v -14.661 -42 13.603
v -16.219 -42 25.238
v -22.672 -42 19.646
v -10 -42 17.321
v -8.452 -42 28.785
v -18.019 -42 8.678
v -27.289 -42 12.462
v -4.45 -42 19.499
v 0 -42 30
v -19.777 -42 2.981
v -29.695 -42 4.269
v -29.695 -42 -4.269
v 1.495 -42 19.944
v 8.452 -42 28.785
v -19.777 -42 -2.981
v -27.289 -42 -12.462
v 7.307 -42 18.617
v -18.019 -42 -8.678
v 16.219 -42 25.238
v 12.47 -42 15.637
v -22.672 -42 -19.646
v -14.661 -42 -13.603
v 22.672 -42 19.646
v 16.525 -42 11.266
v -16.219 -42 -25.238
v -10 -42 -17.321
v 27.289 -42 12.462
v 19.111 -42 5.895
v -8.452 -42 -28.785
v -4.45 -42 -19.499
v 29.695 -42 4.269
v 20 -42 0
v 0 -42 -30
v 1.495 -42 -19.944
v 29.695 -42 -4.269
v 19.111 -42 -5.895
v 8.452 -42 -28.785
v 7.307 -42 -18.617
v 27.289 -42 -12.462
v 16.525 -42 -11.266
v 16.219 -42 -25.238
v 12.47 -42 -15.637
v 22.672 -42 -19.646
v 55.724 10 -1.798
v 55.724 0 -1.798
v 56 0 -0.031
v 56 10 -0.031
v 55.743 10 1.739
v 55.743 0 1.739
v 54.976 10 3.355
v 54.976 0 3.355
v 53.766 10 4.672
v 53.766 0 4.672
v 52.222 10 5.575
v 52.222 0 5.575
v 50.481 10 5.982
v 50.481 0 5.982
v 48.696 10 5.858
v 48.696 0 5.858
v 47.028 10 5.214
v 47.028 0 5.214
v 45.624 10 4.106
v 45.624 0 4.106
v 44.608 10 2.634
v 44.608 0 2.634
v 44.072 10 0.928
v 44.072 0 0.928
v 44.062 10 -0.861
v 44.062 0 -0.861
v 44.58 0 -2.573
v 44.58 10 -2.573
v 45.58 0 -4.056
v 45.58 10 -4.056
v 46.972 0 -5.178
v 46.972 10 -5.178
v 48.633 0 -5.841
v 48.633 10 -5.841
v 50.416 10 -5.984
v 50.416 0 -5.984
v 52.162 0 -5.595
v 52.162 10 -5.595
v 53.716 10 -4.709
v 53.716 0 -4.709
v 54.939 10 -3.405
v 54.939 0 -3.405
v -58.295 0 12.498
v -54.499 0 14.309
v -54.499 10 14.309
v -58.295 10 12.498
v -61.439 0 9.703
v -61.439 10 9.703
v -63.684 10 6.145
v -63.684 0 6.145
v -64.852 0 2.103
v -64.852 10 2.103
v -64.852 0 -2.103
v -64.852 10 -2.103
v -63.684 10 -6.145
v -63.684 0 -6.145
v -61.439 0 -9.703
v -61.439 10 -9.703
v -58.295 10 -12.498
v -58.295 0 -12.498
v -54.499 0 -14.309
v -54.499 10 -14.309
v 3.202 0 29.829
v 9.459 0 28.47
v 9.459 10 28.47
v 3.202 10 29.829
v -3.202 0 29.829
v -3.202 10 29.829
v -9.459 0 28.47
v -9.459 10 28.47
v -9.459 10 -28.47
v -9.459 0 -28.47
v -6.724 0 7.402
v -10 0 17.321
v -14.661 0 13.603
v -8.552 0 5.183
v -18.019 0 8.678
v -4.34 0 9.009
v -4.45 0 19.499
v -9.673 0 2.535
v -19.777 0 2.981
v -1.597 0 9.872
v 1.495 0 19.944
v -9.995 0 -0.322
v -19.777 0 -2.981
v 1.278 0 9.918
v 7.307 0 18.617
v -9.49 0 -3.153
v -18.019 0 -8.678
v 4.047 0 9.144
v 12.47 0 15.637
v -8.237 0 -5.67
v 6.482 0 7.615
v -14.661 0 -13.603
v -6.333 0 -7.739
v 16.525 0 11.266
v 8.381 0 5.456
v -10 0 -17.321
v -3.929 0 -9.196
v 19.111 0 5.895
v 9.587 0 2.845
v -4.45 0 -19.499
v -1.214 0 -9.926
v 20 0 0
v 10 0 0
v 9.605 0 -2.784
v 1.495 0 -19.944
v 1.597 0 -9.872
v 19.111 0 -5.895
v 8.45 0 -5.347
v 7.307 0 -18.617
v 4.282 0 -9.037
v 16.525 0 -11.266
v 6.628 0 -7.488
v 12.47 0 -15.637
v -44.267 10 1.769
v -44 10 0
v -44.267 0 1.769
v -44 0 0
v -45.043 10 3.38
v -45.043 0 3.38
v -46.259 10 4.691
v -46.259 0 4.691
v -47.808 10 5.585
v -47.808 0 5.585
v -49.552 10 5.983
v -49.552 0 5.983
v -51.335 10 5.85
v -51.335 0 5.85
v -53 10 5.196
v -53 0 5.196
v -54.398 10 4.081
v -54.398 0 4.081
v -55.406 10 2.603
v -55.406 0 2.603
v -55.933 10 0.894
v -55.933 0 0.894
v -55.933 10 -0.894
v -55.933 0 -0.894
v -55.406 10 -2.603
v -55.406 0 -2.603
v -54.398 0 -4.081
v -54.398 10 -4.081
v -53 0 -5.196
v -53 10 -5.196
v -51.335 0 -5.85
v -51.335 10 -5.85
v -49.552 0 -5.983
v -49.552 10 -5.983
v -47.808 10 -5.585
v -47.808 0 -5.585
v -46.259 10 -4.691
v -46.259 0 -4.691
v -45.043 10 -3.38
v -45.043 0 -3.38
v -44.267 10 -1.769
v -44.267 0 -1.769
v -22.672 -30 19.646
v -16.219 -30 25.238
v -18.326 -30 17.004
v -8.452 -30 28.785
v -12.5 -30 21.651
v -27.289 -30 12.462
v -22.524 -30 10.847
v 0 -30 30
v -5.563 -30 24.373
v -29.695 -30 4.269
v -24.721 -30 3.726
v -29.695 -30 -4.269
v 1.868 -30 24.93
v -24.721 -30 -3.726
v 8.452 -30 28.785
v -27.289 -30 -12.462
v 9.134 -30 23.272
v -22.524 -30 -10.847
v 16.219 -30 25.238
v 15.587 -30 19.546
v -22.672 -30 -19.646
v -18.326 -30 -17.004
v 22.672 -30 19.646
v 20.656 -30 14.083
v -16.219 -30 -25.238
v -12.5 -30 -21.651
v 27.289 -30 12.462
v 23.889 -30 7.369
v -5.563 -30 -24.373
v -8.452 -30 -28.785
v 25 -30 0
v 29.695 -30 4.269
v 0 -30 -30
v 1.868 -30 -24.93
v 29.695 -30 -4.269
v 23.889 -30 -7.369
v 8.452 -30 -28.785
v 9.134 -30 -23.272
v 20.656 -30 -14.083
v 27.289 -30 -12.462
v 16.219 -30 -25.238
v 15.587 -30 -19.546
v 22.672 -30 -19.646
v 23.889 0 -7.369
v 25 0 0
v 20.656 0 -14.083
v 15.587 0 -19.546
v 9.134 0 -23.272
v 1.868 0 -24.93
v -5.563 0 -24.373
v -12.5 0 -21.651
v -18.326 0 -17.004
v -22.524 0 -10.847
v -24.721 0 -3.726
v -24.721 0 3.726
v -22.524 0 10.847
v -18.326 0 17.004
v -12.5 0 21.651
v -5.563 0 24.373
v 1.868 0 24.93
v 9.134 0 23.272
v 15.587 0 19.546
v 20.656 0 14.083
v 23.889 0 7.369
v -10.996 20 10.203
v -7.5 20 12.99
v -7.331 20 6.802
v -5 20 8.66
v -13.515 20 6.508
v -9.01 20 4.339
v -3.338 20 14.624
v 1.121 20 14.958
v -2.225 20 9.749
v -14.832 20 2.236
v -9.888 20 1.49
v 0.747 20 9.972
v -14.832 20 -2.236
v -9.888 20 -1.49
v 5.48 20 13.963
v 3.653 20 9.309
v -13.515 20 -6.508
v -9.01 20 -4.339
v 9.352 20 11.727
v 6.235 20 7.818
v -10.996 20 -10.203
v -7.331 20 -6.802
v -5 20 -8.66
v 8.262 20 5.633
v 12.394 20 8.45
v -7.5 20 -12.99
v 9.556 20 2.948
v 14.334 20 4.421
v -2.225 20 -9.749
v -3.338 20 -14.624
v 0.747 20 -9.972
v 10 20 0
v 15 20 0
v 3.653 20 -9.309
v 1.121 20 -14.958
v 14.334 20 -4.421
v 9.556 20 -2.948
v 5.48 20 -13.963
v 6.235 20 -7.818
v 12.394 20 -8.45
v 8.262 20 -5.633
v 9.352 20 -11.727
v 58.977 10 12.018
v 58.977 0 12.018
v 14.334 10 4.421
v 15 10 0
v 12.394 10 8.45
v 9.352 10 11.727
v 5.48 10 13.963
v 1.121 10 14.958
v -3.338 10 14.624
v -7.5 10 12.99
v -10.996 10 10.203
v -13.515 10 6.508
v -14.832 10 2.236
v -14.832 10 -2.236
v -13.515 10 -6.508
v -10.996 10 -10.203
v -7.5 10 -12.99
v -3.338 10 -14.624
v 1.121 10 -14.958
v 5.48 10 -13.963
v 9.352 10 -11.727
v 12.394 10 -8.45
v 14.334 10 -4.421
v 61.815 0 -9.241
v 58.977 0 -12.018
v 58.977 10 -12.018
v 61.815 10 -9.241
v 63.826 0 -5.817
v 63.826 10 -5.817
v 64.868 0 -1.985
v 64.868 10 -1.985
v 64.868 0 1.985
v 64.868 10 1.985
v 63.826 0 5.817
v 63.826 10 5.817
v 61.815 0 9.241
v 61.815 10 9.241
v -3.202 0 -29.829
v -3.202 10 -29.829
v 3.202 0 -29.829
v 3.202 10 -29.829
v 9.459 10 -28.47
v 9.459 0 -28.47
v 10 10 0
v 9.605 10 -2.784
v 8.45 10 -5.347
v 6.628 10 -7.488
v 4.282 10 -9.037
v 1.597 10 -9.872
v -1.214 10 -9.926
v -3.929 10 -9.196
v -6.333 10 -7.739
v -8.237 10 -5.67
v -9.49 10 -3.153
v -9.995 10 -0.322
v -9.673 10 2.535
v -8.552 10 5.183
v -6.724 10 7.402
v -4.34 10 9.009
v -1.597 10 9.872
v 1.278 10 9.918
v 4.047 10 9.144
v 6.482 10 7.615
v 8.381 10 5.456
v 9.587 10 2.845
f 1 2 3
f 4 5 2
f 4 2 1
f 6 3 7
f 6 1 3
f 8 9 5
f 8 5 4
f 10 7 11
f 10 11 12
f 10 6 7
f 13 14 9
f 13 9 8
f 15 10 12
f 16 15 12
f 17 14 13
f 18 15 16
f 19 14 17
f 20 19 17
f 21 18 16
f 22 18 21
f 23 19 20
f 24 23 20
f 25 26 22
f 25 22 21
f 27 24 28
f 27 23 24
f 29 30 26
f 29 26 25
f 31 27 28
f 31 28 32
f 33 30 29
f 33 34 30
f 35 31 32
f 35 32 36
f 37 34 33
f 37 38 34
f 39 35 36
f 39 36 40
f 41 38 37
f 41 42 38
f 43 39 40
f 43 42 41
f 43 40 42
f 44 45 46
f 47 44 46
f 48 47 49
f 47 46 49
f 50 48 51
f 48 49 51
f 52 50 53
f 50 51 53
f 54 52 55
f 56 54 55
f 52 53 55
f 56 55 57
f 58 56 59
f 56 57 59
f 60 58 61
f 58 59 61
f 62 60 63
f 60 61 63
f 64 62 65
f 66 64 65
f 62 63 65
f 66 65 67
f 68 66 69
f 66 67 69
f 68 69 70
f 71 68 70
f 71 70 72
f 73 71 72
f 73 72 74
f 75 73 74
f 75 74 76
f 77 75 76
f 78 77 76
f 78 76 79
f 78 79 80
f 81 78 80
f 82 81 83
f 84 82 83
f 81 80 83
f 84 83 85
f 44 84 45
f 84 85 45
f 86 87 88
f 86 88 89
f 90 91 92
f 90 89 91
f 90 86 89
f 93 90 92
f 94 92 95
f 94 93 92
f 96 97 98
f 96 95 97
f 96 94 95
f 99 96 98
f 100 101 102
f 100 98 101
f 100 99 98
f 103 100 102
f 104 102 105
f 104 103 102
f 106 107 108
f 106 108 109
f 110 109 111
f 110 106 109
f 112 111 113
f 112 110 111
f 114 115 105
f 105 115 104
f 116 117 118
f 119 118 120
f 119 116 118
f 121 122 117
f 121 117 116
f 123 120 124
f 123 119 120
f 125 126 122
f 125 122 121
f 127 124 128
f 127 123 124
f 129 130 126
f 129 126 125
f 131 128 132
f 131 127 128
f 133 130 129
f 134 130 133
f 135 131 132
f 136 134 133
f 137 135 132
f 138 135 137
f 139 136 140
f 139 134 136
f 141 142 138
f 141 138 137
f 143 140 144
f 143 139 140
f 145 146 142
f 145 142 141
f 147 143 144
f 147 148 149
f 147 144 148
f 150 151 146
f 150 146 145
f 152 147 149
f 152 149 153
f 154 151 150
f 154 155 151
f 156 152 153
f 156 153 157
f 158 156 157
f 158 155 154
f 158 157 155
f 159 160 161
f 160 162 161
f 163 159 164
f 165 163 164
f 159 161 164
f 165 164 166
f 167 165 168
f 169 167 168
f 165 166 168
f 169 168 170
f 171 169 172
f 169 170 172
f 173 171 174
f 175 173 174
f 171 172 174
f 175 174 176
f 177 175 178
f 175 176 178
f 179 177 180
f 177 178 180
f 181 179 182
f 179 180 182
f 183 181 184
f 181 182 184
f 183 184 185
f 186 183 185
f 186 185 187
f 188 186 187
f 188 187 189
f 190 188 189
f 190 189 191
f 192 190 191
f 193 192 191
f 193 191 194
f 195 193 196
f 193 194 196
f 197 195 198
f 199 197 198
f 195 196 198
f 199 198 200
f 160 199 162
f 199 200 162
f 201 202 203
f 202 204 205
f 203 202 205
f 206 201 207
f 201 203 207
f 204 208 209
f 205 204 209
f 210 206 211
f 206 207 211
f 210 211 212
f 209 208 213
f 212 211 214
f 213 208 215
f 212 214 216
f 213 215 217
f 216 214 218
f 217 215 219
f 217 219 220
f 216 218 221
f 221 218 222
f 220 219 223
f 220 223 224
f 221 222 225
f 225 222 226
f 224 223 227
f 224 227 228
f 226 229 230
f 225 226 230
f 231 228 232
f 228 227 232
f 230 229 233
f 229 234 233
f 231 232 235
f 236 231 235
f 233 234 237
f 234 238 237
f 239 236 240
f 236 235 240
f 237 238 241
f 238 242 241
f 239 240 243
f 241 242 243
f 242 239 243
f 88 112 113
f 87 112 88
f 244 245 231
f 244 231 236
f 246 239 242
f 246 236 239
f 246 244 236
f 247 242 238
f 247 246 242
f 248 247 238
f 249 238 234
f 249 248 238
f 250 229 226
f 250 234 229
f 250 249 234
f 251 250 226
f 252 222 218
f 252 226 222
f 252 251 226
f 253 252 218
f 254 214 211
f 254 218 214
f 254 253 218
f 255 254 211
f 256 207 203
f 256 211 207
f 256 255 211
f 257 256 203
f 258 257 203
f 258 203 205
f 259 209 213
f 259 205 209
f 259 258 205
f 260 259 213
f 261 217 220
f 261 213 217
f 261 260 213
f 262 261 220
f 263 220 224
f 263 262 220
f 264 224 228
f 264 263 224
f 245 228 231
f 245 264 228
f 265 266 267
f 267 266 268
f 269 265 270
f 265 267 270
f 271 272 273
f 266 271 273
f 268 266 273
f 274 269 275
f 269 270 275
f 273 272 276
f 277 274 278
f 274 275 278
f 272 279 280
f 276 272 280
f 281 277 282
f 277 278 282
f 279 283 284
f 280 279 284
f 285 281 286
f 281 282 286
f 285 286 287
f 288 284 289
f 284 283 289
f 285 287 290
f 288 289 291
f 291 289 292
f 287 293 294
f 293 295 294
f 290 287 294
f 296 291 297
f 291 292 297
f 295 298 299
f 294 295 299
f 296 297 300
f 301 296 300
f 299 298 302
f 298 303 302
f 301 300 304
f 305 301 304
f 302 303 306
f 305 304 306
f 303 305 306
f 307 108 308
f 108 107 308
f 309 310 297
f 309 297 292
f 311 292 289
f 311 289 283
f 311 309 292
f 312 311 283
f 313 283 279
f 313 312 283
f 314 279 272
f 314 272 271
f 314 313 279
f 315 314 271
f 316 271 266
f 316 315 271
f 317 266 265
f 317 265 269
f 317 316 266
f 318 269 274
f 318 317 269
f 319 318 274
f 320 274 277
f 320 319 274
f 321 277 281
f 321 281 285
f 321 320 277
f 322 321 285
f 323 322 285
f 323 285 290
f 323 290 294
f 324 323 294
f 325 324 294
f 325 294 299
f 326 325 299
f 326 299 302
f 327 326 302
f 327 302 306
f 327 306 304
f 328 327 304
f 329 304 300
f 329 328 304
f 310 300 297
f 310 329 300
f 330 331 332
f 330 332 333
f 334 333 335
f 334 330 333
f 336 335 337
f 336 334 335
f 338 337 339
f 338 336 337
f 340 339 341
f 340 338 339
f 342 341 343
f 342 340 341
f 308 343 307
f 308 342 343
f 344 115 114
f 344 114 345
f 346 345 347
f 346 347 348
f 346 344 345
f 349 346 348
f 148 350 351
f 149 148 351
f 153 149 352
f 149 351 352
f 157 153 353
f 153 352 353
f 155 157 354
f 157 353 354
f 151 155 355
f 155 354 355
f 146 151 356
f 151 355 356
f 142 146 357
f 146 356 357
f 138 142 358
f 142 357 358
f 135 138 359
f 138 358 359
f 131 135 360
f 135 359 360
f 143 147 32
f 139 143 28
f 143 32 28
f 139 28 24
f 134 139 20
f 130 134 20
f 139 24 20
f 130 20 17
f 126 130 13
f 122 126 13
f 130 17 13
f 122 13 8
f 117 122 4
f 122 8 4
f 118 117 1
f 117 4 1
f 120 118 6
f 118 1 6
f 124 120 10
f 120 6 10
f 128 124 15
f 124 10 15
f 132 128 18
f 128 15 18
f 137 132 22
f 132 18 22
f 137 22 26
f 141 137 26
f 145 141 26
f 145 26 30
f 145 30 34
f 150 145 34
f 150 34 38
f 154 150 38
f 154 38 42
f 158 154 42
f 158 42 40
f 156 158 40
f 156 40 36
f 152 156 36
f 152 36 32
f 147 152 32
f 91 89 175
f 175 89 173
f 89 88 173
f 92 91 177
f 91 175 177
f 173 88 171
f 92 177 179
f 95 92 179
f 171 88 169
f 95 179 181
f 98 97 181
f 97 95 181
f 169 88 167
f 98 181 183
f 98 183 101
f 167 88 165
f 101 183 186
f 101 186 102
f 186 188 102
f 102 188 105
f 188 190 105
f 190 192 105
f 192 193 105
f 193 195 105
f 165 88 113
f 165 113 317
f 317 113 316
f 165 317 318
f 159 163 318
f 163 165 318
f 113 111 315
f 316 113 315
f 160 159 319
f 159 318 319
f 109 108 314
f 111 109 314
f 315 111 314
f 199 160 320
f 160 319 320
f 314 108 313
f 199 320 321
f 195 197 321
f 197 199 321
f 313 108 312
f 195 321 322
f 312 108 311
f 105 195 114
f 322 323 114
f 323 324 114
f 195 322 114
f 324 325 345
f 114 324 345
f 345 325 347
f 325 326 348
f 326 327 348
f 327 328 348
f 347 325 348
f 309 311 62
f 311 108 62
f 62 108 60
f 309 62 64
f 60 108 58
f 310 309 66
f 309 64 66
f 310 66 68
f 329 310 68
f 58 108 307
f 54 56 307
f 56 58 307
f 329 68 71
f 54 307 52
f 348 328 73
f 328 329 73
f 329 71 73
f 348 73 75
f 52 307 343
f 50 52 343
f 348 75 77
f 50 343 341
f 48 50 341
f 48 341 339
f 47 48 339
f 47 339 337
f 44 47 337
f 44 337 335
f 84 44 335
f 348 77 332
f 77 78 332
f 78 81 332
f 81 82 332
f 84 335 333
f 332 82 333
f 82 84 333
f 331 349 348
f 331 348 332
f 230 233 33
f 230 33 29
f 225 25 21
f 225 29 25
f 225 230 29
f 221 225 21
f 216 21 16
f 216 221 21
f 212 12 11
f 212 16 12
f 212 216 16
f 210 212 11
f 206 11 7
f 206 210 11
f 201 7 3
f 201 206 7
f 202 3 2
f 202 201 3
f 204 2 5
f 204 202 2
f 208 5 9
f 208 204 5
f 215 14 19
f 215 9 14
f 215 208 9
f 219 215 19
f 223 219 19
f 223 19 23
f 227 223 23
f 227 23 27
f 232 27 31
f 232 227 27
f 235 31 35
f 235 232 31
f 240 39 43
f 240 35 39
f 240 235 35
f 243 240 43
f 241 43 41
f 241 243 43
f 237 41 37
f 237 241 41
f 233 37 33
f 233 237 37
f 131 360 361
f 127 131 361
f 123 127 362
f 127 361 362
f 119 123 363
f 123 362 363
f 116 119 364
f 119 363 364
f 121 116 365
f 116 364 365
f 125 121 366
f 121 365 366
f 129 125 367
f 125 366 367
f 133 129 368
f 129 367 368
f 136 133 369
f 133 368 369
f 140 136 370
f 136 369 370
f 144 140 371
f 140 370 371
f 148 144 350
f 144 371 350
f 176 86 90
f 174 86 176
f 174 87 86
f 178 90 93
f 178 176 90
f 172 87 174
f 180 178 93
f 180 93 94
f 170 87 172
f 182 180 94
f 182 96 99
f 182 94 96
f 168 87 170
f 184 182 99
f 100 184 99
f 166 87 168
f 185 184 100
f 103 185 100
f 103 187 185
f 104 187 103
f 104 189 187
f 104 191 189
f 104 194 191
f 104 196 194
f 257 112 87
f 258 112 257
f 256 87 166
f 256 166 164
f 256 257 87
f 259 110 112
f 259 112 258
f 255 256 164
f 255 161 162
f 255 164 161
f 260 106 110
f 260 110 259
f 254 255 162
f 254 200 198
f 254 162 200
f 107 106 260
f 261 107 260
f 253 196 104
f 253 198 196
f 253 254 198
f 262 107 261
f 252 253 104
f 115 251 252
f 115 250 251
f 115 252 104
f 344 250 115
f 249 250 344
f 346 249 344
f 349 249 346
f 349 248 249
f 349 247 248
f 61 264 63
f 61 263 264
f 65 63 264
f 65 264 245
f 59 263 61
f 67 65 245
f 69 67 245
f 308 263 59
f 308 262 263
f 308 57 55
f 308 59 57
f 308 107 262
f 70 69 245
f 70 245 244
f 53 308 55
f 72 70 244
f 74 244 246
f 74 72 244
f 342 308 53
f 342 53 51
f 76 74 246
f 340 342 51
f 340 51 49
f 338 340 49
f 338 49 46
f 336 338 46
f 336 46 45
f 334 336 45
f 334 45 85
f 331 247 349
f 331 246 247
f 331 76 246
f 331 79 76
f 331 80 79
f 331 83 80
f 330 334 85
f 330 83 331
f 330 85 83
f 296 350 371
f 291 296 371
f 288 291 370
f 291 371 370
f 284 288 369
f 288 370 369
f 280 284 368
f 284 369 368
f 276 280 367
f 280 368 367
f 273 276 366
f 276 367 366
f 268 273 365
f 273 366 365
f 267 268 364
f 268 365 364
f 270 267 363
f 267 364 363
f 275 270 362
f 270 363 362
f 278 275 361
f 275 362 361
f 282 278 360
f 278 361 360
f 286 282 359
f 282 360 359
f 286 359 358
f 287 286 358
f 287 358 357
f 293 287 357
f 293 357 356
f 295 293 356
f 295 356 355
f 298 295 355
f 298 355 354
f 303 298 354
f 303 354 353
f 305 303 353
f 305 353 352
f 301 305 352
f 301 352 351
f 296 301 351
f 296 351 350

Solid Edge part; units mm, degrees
sketch "Sketch1" plane through (0, 0, 0) normal (0, -1, 0) x (1, 0, 0)
  line L0 (-9.4591, 28.4697) -> (-54.4988, 14.3095)
  line L1 (-9.4591, -28.4697) -> (-54.4988, -14.3095)
  arc A0 (-9.4591, 28.4697) -> (-9.4591, -28.4697) centre (0, 0) ccw
  arc A1 (-54.4988, -14.3095) -> (-54.4988, 14.3095) centre (-50, 0) cw
  circle A2 centre (-50, 0) radius 6
extrude "Protrusion1" add sketch "Sketch1" against normal blind 10
sketch "Sketch2" plane through (0, 0, 0) normal (0, -1, 0) x (1, 0, 0)
  line L0 (9.4591, -28.4697) -> (58.9766, -12.0175)
  arc A0 (9.4591, 28.4697) -> (9.4591, -28.4697) centre (0, 0) cw
  line L1 (9.4591, 28.4697) -> (58.9766, 12.0175)
  arc A1 (58.9766, 12.0175) -> (58.9766, -12.0175) centre (50, 0) cw
extrude "ExtrudedProtrusion_2" add sketch "Sketch2" against normal blind 10
sketch "Sketch3" plane through (0, 0, 0) normal (0, -1, 0) x (1, 0, 0)
  circle A0 centre (0, 0) radius 30
extrude "ExtrudedProtrusion_3" add sketch "Sketch3" against normal blind 10
sketch "Sketch4" plane through (0, 0, 0) normal (0, -1, 0) x (1, 0, 0)
  circle A0 centre (0, 0) radius 25
  circle A1 centre (0, 0) radius 10
extrude "ExtrudedProtrusion_6" add sketch "Sketch4" along normal blind 30
sketch "Sketch5" plane through (0, 10, 0) normal (0, 1, 0) x (-0.949, 0, -0.3153)
  circle A0 centre (0, 0) radius 10
extrude "ExtrudedCutout_1" cut sketch "Sketch5" against normal blind 62
sketch "Sketch6" plane through (0, 0, 0) normal (0, -1, 0) x (1, 0, 0)
  circle A0 centre (0, 0) radius 10
  circle A1 centre (0, 0) radius 15
extrude "ExtrudedProtrusion_11" add sketch "Sketch6" against normal blind 20
sketch "Sketch7" plane through (0, 0, 0) normal (0, -1, 0) x (0.954, 0, -0.2999)
  circle A0 centre (47.6982, 14.9961) radius 6
extrude "ExtrudedCutout_2" cut sketch "Sketch7" against normal blind 10
sketch "Sketch8" plane through (0, -30, 0) normal (0, -1, 0) x (0, 0, -1)
  circle A0 centre (0, 0) radius 30
extrude "ExtrudedProtrusion_12" add sketch "Sketch8" along normal blind 12
sketch "Sketch9" plane through (0, -42, 0) normal (0, -1, 0) x (1, 0, 0)
  circle A0 centre (0, 0) radius 20
extrude "ExtrudedCutout_3" cut sketch "Sketch9" against normal blind 42
